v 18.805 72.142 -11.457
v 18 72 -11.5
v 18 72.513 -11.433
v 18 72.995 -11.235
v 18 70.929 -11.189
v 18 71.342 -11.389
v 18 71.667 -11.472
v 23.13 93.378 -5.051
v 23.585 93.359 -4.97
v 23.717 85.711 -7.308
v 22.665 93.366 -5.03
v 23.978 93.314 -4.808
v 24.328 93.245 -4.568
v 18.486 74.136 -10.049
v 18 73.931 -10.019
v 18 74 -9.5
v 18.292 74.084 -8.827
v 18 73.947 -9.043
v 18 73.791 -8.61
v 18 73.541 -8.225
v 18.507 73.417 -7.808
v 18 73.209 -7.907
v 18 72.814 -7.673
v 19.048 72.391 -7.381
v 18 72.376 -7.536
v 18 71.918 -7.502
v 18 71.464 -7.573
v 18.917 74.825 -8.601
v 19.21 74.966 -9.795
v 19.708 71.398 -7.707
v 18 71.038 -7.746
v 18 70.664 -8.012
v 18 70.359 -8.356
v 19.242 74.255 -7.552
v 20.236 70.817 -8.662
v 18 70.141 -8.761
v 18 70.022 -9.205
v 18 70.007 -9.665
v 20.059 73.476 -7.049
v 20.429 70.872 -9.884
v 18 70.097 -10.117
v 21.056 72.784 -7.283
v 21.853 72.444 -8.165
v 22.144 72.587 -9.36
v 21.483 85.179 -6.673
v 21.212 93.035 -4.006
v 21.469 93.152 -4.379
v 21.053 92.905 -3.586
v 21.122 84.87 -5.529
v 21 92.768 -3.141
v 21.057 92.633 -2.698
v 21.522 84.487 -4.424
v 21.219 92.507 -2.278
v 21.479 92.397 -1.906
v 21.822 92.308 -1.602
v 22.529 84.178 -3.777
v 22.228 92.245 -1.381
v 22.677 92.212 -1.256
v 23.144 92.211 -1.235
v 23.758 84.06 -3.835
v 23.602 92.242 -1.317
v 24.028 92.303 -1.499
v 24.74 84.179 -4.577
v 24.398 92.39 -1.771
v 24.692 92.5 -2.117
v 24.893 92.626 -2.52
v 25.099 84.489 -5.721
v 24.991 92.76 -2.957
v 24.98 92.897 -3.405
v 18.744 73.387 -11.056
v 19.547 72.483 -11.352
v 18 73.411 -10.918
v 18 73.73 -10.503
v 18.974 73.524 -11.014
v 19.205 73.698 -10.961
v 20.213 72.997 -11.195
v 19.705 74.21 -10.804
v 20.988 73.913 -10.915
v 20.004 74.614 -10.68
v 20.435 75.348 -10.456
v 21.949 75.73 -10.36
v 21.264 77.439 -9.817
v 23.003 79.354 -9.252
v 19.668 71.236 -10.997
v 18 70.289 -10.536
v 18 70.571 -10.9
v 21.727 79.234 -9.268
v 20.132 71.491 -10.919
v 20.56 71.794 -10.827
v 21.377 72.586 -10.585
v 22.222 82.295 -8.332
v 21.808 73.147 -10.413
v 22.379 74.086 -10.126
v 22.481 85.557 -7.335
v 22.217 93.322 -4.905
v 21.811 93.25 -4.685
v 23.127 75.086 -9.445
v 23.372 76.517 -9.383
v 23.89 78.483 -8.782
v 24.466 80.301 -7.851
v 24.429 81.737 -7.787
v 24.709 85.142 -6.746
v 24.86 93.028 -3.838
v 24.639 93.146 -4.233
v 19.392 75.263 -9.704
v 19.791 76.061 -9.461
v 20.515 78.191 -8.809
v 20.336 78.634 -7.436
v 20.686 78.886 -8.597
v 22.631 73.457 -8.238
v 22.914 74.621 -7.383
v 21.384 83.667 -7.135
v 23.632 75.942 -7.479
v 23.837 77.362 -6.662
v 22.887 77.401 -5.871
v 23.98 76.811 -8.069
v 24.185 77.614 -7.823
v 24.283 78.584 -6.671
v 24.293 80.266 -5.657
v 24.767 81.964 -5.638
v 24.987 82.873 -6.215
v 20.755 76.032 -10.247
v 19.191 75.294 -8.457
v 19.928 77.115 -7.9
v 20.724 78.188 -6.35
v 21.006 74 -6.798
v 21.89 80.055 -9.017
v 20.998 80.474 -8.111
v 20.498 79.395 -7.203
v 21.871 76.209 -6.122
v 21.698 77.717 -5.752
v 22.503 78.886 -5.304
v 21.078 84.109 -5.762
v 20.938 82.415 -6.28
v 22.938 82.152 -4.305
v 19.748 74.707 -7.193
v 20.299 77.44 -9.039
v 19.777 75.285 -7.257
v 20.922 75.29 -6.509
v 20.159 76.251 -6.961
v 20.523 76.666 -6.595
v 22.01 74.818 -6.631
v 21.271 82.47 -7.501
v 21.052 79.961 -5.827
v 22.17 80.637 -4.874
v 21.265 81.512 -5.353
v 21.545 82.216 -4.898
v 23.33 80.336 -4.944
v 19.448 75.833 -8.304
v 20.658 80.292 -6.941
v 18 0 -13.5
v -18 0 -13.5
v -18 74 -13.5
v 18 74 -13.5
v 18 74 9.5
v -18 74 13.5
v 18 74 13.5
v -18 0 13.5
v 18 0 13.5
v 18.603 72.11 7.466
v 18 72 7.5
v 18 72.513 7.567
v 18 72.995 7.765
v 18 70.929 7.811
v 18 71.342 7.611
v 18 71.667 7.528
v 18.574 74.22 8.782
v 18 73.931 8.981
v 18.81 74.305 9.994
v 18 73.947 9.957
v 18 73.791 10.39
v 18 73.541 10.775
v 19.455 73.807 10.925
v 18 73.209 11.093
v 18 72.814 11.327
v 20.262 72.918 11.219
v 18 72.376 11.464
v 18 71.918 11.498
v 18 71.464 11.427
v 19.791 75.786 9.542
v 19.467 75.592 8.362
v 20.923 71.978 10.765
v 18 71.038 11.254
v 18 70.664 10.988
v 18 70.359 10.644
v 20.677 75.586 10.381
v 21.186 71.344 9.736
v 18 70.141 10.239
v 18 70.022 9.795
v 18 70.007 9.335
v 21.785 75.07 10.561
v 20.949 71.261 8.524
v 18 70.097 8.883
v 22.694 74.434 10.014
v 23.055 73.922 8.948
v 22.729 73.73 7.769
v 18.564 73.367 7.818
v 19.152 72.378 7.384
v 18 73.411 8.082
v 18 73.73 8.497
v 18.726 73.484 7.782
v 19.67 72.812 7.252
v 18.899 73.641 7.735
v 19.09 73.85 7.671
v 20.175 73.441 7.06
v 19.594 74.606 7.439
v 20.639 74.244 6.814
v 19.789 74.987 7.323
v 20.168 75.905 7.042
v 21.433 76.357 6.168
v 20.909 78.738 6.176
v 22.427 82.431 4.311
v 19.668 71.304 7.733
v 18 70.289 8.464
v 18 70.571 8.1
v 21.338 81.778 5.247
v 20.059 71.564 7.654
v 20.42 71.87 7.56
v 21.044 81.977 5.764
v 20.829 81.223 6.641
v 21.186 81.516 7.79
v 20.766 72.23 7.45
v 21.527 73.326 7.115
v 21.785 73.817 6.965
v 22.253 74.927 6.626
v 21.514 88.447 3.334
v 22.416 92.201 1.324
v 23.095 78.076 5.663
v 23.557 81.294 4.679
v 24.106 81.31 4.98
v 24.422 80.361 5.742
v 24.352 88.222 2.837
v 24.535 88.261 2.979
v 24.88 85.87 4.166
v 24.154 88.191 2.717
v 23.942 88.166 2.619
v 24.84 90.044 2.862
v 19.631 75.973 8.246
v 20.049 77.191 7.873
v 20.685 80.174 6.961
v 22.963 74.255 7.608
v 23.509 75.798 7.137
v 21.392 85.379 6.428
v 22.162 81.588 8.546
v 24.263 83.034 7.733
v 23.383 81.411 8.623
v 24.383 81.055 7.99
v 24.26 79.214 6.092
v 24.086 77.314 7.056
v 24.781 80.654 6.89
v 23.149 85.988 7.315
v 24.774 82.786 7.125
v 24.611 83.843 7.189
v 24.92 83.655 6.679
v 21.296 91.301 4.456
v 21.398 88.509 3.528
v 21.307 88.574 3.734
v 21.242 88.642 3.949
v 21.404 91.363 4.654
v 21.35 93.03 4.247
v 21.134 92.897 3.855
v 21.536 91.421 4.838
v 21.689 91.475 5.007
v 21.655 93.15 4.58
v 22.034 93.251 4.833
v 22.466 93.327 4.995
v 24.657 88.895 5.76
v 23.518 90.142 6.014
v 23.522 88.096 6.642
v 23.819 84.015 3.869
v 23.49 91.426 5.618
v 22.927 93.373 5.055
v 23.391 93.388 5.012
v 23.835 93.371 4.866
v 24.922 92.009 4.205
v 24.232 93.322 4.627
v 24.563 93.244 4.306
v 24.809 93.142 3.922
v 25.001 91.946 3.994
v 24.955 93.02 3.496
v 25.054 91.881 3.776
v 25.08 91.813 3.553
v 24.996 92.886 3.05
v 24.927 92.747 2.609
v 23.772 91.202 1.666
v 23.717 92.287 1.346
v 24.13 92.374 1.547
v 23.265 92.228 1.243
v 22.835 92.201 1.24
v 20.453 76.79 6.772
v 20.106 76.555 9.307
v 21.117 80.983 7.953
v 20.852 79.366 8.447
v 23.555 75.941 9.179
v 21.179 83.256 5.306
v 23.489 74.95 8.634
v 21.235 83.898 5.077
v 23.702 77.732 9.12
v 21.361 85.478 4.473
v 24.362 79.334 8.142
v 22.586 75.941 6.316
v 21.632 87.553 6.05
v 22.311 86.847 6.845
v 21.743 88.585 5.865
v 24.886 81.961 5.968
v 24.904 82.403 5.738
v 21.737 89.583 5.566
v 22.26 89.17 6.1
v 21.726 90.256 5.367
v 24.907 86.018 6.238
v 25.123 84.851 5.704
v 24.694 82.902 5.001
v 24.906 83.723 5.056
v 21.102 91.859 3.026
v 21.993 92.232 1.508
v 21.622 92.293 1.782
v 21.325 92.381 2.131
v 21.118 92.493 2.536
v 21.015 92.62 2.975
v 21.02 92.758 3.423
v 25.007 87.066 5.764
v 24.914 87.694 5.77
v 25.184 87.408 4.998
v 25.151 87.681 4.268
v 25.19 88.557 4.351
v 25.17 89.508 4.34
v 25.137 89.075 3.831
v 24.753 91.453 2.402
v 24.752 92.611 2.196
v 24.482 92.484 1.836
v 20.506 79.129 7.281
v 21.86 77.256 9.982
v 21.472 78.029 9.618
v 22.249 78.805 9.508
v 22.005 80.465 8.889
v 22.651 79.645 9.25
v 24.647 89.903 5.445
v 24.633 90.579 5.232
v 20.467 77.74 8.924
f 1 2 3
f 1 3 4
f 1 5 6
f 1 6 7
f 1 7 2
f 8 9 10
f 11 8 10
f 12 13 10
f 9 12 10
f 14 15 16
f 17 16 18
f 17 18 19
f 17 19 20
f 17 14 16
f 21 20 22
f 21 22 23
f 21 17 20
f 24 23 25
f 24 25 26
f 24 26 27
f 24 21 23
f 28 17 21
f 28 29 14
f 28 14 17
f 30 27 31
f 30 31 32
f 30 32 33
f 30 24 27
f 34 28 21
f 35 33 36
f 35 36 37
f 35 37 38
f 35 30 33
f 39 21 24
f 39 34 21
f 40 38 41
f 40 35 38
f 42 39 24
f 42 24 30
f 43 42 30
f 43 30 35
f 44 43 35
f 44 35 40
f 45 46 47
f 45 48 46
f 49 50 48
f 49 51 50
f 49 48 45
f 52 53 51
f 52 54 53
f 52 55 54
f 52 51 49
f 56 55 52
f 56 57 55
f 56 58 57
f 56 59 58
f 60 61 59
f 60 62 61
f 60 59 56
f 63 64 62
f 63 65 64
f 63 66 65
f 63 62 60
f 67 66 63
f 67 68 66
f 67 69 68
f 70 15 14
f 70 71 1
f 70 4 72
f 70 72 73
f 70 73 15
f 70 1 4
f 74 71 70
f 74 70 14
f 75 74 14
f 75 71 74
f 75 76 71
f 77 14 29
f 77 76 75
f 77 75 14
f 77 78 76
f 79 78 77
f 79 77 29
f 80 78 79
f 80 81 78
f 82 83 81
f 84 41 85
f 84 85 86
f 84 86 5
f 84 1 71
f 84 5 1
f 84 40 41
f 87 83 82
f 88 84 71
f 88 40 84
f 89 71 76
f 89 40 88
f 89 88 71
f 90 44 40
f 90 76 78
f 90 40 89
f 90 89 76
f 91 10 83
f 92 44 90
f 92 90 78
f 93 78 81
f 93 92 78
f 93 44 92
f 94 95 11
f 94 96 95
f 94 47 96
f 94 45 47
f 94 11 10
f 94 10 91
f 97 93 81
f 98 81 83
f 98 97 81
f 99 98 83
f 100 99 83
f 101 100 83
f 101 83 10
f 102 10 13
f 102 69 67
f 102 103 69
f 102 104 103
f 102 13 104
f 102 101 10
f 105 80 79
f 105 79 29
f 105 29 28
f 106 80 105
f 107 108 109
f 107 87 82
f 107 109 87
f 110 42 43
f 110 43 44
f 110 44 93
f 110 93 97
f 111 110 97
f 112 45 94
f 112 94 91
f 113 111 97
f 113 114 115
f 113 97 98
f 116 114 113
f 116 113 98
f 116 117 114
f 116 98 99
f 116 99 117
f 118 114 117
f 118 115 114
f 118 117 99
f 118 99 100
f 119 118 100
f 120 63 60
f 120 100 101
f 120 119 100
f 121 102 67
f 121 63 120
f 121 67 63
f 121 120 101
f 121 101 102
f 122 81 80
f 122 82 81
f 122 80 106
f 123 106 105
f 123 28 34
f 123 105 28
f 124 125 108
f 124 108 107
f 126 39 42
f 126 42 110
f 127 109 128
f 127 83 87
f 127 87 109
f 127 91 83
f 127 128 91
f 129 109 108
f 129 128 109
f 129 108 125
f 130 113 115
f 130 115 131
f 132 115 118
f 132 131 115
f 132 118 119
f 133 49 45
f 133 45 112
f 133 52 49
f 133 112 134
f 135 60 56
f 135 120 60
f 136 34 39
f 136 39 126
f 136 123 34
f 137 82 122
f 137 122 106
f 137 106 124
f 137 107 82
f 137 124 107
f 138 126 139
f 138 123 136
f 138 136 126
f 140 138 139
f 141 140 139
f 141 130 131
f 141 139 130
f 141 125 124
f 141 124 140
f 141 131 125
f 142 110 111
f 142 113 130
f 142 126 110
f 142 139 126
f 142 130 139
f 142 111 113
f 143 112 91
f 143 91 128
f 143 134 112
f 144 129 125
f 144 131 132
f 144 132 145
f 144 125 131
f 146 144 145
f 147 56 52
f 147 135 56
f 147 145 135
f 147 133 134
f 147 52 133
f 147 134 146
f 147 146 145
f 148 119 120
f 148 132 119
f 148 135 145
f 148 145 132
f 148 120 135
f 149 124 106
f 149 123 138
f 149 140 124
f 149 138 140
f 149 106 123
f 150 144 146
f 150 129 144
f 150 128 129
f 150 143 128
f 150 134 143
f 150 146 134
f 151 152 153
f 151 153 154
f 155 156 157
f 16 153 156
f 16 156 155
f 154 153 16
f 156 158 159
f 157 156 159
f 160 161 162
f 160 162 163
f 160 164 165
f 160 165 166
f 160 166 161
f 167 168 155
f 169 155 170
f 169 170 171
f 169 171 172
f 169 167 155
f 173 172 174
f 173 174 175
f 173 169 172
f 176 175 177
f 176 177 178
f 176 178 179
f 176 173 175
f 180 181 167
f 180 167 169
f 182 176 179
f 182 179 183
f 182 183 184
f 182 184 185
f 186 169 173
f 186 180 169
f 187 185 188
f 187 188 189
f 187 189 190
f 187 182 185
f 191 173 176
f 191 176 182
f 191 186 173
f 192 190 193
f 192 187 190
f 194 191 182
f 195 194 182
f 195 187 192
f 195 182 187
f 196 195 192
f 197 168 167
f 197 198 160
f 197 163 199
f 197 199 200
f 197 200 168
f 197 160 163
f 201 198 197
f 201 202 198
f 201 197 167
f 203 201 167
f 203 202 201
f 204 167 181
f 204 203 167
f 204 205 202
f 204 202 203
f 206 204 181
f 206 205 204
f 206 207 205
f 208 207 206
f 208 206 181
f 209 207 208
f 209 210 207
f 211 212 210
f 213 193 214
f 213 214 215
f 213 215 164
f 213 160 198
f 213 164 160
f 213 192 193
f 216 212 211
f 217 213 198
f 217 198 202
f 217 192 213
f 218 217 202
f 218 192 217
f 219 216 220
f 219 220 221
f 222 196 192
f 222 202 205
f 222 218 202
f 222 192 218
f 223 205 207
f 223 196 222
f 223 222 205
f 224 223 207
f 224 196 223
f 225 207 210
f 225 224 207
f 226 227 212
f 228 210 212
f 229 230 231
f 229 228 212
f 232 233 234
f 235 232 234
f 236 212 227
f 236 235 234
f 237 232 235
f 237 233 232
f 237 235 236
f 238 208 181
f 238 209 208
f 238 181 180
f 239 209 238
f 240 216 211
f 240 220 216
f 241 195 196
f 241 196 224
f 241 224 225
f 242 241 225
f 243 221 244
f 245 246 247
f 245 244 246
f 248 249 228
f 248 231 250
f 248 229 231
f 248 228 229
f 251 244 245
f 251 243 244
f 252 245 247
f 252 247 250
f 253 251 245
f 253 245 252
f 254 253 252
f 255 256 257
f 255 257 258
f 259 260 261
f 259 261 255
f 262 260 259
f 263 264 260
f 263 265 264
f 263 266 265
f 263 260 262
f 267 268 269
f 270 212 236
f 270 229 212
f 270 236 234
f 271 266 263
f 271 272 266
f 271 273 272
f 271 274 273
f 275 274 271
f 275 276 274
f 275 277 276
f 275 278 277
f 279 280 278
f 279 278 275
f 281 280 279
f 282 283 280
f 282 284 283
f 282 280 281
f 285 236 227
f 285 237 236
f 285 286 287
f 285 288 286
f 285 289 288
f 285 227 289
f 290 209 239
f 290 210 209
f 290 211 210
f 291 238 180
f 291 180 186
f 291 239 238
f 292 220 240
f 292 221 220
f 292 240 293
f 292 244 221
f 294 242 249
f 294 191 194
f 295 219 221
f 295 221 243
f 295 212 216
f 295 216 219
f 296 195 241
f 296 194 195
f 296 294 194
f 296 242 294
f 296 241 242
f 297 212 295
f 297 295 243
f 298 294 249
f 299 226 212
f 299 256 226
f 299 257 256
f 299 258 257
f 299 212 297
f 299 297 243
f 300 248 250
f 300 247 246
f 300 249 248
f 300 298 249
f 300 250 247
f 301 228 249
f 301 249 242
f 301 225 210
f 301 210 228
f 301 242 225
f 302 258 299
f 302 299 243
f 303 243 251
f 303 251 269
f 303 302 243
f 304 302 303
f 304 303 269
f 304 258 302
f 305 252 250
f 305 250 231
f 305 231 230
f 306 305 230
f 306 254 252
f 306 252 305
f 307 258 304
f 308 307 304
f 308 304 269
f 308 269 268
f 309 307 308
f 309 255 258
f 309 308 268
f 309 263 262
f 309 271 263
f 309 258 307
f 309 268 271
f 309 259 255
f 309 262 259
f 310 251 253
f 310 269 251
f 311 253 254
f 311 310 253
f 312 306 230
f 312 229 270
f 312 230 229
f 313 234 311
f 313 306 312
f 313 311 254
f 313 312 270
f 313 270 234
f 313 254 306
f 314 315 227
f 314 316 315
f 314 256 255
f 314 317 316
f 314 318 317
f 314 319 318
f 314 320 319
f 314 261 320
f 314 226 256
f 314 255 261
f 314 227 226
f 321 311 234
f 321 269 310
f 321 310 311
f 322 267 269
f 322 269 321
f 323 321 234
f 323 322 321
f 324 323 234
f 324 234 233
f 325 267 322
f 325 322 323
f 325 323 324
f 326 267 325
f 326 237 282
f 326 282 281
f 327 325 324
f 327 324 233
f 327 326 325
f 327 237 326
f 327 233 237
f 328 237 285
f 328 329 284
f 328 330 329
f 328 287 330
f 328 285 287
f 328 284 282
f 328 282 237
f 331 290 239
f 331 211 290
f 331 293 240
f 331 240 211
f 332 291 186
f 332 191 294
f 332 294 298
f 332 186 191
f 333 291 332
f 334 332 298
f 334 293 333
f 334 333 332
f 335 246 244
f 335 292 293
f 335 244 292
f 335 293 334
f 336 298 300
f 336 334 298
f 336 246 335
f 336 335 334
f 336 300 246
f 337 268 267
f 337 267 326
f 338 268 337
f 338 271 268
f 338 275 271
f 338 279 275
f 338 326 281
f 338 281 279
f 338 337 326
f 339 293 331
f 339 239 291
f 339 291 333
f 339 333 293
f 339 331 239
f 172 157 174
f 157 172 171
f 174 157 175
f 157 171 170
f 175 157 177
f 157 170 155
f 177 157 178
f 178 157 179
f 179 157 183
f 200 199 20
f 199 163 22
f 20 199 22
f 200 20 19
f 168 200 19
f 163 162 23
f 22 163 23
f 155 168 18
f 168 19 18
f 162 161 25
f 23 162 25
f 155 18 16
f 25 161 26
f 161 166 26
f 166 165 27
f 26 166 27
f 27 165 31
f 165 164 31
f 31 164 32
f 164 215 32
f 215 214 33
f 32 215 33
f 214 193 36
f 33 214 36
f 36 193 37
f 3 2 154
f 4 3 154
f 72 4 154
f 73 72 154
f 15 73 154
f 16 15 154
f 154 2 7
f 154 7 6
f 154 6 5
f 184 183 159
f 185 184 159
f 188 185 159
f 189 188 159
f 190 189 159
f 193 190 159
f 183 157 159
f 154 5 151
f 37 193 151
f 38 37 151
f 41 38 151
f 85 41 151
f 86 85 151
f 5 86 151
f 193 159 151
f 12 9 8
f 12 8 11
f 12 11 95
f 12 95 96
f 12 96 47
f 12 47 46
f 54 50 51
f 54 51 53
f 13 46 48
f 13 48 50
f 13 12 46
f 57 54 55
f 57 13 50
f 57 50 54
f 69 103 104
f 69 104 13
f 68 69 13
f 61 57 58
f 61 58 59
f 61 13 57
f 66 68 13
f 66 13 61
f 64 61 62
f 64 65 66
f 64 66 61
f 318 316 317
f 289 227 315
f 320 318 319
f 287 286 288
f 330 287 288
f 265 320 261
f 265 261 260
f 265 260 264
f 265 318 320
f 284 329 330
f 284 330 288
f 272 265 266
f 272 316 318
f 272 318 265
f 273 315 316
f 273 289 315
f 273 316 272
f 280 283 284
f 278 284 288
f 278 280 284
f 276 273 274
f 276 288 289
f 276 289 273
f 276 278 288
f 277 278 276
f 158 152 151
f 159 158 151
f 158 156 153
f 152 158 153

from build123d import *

# Parameters (mm, degrees)
SKETCH_1_W      = 36
SKETCH_1_H      = 27
EXTRUDE_1_DEPTH = 74
SKETCH_2_R      = 2
SKETCH_7_R      = 2


with BuildPart() as part:
    # Эскиз1 → Бобышка-Вытянуть1 (new body)
    with BuildSketch(Plane(origin=(0, 0, 0), x_dir=(1, 0, 0), z_dir=(0, 1, 0))):
        Rectangle(SKETCH_1_W, SKETCH_1_H)
    extrude(amount=EXTRUDE_1_DEPTH)

    # По траектории1: sweep along a path in Эскиз4
    with BuildLine() as sweep_1_path:  # in the path sketch's own coordinates; laid on its plane below (add() does not lay a ready-made edge on the line's plane)
        add(Edge.make_bspline(
            [(-18, -66.076411234), (-23.742943234, -66.28318966), (-23.404198894, -83.547219803), (-23, -87.819533928)],
            knots=[0, 0, 0, 0, 1, 1, 1, 1], degree=3))
    # Эскиз2 → По траектории1 (sweep)
    with BuildSketch(Plane(origin=(18, 0, 0), x_dir=(0, 0, -1), z_dir=(1, 0, 0))):
        with Locations((-9.5, 72)):
            Circle(SKETCH_2_R)
    sweep(path=Plane(origin=(0, 8.81081368, 28.818872995), x_dir=(-1, 0, 0), z_dir=(0, 0.2923717047227373, 0.9563047559630353)) * sweep_1_path.line)

    # По траектории2: sweep along a path in Эскиз6
    with BuildLine() as sweep_2_path:  # in the path sketch's own coordinates; laid on its plane below (add() does not lay a ready-made edge on the line's plane)
        add(Edge.make_bspline(
            [(-18, 66.076411234), (-21.87269918, 66.293847573), (-23.822441066, 75.687463782), (-23, 87.819533928)],
            knots=[0, 0, 0, 0, 1, 1, 1, 1], degree=3))
    # Эскиз7 → По траектории2 (sweep)
    with BuildSketch(Plane(origin=(18, 0, 0), x_dir=(0, 0, -1), z_dir=(1, 0, 0))):
        with Locations((9.5, 72)):
            Circle(SKETCH_7_R)
    sweep(path=Plane(origin=(0, 8.81081368, -28.818872995), x_dir=(-1, 0, 0), z_dir=(0, 0.2923717047227373, -0.9563047559630353)) * sweep_2_path.line)


solid = part.part
